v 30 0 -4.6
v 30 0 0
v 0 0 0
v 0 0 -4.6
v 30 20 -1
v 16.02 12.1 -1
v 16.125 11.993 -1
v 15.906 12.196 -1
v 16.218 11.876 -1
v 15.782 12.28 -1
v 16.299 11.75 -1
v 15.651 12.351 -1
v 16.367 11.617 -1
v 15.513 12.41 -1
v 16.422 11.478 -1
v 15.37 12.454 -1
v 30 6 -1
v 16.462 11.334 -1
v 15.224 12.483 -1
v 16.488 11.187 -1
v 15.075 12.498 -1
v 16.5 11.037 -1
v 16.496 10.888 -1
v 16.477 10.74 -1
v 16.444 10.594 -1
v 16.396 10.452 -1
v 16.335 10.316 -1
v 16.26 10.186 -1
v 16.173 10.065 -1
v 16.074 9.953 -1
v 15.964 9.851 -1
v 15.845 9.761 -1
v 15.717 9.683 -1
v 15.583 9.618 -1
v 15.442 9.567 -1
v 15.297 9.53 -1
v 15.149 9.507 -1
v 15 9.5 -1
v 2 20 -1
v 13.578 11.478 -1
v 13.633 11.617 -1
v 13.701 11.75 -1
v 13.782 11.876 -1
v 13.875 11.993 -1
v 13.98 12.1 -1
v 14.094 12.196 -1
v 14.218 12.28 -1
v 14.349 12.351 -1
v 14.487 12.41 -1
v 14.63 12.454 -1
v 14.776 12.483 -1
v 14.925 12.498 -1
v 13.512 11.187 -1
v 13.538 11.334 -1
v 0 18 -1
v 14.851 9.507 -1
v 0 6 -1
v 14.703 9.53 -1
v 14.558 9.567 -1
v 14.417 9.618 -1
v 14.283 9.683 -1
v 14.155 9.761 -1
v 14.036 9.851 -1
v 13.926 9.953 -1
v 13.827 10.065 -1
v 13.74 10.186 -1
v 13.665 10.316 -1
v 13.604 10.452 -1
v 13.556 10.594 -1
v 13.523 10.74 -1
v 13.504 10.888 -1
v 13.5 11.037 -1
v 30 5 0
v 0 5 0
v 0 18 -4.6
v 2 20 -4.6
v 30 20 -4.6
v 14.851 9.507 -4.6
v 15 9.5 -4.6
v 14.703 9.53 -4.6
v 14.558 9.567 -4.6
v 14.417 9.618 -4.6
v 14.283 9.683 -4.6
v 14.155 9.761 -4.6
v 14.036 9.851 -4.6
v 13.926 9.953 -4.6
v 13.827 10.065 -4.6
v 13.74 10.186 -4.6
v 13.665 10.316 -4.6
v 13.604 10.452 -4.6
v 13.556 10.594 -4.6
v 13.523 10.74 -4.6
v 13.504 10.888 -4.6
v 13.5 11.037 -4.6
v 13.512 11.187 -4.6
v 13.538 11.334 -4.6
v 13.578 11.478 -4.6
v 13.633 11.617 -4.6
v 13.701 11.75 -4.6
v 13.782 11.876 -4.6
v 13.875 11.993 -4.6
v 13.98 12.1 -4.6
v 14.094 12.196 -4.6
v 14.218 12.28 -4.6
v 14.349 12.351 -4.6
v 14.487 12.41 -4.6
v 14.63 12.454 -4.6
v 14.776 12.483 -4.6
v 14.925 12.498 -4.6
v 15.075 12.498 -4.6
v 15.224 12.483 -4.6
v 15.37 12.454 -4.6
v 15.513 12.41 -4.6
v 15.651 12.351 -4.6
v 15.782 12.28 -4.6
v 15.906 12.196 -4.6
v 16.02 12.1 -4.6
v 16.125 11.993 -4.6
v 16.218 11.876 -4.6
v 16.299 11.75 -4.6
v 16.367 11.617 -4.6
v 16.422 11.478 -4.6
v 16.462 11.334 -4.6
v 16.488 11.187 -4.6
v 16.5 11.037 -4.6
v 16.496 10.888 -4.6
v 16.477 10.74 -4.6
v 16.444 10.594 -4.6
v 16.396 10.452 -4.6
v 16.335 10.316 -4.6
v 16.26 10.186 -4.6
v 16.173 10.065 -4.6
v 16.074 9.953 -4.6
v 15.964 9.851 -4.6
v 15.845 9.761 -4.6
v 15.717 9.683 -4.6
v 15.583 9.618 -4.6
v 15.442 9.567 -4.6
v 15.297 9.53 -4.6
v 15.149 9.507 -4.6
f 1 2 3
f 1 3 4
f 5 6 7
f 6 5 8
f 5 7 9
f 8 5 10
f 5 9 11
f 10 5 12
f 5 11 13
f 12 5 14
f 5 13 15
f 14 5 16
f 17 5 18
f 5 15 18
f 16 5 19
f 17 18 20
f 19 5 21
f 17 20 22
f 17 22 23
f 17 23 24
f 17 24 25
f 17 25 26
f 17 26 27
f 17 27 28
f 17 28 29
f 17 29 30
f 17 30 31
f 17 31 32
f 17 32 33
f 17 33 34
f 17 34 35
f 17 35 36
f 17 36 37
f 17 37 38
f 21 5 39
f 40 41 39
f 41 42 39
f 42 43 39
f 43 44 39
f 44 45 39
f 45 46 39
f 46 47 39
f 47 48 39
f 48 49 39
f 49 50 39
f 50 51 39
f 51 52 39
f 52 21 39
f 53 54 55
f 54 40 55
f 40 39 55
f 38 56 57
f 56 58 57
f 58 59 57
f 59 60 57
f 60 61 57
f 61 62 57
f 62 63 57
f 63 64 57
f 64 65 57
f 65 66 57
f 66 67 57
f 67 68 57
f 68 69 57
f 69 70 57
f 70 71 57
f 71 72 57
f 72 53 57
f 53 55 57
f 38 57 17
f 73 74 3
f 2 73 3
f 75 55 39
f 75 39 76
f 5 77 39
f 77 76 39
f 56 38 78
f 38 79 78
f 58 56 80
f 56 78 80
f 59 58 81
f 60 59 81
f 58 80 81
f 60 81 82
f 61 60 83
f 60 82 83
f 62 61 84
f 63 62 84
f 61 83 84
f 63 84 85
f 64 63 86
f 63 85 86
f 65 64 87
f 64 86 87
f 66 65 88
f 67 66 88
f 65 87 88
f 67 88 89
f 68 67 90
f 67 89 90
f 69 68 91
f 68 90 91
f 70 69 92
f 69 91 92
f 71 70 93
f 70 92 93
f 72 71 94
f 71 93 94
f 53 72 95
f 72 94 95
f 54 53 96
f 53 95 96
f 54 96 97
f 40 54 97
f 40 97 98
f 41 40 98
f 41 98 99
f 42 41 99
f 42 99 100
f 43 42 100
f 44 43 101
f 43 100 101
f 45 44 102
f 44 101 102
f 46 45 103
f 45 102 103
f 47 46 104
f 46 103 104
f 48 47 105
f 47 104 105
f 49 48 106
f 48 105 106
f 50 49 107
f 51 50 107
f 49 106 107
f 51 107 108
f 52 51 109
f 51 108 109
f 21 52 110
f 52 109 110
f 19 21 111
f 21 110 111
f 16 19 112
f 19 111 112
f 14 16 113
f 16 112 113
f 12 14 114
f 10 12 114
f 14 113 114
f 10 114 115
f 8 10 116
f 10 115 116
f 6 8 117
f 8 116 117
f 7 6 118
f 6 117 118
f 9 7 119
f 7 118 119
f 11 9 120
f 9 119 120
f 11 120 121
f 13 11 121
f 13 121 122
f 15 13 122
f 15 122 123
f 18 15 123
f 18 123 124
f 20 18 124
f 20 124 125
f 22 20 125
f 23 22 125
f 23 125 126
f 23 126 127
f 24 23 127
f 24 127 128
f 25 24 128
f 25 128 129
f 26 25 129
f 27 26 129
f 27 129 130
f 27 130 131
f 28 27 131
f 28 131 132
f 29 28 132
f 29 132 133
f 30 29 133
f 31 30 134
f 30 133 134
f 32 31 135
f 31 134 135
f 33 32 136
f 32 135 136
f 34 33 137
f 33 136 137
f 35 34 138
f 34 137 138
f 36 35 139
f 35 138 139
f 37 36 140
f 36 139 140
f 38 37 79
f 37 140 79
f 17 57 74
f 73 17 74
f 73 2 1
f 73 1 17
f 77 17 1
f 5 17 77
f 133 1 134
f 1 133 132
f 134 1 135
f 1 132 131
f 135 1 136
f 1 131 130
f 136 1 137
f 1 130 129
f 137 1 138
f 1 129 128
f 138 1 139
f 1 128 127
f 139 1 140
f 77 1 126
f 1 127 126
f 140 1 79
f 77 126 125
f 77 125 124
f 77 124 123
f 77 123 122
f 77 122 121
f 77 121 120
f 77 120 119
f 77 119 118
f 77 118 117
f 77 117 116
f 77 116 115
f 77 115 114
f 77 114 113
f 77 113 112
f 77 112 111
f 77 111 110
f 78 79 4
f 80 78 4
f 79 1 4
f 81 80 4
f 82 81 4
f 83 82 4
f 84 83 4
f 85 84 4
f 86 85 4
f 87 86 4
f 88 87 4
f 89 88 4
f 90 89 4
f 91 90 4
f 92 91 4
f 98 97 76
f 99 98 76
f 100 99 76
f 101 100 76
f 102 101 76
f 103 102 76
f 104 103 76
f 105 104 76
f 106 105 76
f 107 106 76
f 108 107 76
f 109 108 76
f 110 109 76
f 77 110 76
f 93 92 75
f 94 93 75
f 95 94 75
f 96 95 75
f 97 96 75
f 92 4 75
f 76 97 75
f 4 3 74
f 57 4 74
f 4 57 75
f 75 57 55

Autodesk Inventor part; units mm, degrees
ref_plane "YZ Plane" through (0, 0, 0) normal (1, 0, 0) x (0, 1, 0)
ref_plane "XZ Plane" through (0, 0, 0) normal (0, 1, 0) x (-1, 0, 0)
ref_plane "XY Plane" through (0, 0, 0) normal (0, 0, 1) x (1, 0, 0)
sketch "Sketch1" plane through (0, 0, 0) normal (1, 0, 0) x (0, 1, 0)
  line L0 (0, 0) -> (0, -4.6)
  line L1 (0, -4.6) -> (20, -4.6)
  line L2 (20, -4.6) -> (20, -1)
  line L3 (20, -1) -> (6, -1)
  line L4 (6, -1) -> (5, 0)
  line L5 (5, 0) -> (0, 0)
  dimension "d1" = 20
  dimension "d2" = 5
  dimension "d3" = 3.6
  dimension "d4" = 4.6
  dimension "d5" = 1
extrude "Extrusion1" add sketch "Sketch1" along normal blind 30
chamfer "Chamfer1" distance 2 angle 45 1 edges at (0, 20, -2.8)
sketch "Sketch2" plane through (0, 6, -1) normal (0, 0, 1) x (1, 0, 0)
  circle A0 centre (15, 5) radius 1.6
  line L0 (0, -6) -> (30, -6) projected
  line L1 (30, 14) -> (30, 0) projected
  dimension "d11" = 11
  dimension "d12" = 3.2
  dimension "d13" = 15
hole "Hole1" at (15, 11, -1) direction (0, 0, -1) diameter 3 depth 10 tip angle 118
properties part number "BrueckenGR_LVE2560E"
